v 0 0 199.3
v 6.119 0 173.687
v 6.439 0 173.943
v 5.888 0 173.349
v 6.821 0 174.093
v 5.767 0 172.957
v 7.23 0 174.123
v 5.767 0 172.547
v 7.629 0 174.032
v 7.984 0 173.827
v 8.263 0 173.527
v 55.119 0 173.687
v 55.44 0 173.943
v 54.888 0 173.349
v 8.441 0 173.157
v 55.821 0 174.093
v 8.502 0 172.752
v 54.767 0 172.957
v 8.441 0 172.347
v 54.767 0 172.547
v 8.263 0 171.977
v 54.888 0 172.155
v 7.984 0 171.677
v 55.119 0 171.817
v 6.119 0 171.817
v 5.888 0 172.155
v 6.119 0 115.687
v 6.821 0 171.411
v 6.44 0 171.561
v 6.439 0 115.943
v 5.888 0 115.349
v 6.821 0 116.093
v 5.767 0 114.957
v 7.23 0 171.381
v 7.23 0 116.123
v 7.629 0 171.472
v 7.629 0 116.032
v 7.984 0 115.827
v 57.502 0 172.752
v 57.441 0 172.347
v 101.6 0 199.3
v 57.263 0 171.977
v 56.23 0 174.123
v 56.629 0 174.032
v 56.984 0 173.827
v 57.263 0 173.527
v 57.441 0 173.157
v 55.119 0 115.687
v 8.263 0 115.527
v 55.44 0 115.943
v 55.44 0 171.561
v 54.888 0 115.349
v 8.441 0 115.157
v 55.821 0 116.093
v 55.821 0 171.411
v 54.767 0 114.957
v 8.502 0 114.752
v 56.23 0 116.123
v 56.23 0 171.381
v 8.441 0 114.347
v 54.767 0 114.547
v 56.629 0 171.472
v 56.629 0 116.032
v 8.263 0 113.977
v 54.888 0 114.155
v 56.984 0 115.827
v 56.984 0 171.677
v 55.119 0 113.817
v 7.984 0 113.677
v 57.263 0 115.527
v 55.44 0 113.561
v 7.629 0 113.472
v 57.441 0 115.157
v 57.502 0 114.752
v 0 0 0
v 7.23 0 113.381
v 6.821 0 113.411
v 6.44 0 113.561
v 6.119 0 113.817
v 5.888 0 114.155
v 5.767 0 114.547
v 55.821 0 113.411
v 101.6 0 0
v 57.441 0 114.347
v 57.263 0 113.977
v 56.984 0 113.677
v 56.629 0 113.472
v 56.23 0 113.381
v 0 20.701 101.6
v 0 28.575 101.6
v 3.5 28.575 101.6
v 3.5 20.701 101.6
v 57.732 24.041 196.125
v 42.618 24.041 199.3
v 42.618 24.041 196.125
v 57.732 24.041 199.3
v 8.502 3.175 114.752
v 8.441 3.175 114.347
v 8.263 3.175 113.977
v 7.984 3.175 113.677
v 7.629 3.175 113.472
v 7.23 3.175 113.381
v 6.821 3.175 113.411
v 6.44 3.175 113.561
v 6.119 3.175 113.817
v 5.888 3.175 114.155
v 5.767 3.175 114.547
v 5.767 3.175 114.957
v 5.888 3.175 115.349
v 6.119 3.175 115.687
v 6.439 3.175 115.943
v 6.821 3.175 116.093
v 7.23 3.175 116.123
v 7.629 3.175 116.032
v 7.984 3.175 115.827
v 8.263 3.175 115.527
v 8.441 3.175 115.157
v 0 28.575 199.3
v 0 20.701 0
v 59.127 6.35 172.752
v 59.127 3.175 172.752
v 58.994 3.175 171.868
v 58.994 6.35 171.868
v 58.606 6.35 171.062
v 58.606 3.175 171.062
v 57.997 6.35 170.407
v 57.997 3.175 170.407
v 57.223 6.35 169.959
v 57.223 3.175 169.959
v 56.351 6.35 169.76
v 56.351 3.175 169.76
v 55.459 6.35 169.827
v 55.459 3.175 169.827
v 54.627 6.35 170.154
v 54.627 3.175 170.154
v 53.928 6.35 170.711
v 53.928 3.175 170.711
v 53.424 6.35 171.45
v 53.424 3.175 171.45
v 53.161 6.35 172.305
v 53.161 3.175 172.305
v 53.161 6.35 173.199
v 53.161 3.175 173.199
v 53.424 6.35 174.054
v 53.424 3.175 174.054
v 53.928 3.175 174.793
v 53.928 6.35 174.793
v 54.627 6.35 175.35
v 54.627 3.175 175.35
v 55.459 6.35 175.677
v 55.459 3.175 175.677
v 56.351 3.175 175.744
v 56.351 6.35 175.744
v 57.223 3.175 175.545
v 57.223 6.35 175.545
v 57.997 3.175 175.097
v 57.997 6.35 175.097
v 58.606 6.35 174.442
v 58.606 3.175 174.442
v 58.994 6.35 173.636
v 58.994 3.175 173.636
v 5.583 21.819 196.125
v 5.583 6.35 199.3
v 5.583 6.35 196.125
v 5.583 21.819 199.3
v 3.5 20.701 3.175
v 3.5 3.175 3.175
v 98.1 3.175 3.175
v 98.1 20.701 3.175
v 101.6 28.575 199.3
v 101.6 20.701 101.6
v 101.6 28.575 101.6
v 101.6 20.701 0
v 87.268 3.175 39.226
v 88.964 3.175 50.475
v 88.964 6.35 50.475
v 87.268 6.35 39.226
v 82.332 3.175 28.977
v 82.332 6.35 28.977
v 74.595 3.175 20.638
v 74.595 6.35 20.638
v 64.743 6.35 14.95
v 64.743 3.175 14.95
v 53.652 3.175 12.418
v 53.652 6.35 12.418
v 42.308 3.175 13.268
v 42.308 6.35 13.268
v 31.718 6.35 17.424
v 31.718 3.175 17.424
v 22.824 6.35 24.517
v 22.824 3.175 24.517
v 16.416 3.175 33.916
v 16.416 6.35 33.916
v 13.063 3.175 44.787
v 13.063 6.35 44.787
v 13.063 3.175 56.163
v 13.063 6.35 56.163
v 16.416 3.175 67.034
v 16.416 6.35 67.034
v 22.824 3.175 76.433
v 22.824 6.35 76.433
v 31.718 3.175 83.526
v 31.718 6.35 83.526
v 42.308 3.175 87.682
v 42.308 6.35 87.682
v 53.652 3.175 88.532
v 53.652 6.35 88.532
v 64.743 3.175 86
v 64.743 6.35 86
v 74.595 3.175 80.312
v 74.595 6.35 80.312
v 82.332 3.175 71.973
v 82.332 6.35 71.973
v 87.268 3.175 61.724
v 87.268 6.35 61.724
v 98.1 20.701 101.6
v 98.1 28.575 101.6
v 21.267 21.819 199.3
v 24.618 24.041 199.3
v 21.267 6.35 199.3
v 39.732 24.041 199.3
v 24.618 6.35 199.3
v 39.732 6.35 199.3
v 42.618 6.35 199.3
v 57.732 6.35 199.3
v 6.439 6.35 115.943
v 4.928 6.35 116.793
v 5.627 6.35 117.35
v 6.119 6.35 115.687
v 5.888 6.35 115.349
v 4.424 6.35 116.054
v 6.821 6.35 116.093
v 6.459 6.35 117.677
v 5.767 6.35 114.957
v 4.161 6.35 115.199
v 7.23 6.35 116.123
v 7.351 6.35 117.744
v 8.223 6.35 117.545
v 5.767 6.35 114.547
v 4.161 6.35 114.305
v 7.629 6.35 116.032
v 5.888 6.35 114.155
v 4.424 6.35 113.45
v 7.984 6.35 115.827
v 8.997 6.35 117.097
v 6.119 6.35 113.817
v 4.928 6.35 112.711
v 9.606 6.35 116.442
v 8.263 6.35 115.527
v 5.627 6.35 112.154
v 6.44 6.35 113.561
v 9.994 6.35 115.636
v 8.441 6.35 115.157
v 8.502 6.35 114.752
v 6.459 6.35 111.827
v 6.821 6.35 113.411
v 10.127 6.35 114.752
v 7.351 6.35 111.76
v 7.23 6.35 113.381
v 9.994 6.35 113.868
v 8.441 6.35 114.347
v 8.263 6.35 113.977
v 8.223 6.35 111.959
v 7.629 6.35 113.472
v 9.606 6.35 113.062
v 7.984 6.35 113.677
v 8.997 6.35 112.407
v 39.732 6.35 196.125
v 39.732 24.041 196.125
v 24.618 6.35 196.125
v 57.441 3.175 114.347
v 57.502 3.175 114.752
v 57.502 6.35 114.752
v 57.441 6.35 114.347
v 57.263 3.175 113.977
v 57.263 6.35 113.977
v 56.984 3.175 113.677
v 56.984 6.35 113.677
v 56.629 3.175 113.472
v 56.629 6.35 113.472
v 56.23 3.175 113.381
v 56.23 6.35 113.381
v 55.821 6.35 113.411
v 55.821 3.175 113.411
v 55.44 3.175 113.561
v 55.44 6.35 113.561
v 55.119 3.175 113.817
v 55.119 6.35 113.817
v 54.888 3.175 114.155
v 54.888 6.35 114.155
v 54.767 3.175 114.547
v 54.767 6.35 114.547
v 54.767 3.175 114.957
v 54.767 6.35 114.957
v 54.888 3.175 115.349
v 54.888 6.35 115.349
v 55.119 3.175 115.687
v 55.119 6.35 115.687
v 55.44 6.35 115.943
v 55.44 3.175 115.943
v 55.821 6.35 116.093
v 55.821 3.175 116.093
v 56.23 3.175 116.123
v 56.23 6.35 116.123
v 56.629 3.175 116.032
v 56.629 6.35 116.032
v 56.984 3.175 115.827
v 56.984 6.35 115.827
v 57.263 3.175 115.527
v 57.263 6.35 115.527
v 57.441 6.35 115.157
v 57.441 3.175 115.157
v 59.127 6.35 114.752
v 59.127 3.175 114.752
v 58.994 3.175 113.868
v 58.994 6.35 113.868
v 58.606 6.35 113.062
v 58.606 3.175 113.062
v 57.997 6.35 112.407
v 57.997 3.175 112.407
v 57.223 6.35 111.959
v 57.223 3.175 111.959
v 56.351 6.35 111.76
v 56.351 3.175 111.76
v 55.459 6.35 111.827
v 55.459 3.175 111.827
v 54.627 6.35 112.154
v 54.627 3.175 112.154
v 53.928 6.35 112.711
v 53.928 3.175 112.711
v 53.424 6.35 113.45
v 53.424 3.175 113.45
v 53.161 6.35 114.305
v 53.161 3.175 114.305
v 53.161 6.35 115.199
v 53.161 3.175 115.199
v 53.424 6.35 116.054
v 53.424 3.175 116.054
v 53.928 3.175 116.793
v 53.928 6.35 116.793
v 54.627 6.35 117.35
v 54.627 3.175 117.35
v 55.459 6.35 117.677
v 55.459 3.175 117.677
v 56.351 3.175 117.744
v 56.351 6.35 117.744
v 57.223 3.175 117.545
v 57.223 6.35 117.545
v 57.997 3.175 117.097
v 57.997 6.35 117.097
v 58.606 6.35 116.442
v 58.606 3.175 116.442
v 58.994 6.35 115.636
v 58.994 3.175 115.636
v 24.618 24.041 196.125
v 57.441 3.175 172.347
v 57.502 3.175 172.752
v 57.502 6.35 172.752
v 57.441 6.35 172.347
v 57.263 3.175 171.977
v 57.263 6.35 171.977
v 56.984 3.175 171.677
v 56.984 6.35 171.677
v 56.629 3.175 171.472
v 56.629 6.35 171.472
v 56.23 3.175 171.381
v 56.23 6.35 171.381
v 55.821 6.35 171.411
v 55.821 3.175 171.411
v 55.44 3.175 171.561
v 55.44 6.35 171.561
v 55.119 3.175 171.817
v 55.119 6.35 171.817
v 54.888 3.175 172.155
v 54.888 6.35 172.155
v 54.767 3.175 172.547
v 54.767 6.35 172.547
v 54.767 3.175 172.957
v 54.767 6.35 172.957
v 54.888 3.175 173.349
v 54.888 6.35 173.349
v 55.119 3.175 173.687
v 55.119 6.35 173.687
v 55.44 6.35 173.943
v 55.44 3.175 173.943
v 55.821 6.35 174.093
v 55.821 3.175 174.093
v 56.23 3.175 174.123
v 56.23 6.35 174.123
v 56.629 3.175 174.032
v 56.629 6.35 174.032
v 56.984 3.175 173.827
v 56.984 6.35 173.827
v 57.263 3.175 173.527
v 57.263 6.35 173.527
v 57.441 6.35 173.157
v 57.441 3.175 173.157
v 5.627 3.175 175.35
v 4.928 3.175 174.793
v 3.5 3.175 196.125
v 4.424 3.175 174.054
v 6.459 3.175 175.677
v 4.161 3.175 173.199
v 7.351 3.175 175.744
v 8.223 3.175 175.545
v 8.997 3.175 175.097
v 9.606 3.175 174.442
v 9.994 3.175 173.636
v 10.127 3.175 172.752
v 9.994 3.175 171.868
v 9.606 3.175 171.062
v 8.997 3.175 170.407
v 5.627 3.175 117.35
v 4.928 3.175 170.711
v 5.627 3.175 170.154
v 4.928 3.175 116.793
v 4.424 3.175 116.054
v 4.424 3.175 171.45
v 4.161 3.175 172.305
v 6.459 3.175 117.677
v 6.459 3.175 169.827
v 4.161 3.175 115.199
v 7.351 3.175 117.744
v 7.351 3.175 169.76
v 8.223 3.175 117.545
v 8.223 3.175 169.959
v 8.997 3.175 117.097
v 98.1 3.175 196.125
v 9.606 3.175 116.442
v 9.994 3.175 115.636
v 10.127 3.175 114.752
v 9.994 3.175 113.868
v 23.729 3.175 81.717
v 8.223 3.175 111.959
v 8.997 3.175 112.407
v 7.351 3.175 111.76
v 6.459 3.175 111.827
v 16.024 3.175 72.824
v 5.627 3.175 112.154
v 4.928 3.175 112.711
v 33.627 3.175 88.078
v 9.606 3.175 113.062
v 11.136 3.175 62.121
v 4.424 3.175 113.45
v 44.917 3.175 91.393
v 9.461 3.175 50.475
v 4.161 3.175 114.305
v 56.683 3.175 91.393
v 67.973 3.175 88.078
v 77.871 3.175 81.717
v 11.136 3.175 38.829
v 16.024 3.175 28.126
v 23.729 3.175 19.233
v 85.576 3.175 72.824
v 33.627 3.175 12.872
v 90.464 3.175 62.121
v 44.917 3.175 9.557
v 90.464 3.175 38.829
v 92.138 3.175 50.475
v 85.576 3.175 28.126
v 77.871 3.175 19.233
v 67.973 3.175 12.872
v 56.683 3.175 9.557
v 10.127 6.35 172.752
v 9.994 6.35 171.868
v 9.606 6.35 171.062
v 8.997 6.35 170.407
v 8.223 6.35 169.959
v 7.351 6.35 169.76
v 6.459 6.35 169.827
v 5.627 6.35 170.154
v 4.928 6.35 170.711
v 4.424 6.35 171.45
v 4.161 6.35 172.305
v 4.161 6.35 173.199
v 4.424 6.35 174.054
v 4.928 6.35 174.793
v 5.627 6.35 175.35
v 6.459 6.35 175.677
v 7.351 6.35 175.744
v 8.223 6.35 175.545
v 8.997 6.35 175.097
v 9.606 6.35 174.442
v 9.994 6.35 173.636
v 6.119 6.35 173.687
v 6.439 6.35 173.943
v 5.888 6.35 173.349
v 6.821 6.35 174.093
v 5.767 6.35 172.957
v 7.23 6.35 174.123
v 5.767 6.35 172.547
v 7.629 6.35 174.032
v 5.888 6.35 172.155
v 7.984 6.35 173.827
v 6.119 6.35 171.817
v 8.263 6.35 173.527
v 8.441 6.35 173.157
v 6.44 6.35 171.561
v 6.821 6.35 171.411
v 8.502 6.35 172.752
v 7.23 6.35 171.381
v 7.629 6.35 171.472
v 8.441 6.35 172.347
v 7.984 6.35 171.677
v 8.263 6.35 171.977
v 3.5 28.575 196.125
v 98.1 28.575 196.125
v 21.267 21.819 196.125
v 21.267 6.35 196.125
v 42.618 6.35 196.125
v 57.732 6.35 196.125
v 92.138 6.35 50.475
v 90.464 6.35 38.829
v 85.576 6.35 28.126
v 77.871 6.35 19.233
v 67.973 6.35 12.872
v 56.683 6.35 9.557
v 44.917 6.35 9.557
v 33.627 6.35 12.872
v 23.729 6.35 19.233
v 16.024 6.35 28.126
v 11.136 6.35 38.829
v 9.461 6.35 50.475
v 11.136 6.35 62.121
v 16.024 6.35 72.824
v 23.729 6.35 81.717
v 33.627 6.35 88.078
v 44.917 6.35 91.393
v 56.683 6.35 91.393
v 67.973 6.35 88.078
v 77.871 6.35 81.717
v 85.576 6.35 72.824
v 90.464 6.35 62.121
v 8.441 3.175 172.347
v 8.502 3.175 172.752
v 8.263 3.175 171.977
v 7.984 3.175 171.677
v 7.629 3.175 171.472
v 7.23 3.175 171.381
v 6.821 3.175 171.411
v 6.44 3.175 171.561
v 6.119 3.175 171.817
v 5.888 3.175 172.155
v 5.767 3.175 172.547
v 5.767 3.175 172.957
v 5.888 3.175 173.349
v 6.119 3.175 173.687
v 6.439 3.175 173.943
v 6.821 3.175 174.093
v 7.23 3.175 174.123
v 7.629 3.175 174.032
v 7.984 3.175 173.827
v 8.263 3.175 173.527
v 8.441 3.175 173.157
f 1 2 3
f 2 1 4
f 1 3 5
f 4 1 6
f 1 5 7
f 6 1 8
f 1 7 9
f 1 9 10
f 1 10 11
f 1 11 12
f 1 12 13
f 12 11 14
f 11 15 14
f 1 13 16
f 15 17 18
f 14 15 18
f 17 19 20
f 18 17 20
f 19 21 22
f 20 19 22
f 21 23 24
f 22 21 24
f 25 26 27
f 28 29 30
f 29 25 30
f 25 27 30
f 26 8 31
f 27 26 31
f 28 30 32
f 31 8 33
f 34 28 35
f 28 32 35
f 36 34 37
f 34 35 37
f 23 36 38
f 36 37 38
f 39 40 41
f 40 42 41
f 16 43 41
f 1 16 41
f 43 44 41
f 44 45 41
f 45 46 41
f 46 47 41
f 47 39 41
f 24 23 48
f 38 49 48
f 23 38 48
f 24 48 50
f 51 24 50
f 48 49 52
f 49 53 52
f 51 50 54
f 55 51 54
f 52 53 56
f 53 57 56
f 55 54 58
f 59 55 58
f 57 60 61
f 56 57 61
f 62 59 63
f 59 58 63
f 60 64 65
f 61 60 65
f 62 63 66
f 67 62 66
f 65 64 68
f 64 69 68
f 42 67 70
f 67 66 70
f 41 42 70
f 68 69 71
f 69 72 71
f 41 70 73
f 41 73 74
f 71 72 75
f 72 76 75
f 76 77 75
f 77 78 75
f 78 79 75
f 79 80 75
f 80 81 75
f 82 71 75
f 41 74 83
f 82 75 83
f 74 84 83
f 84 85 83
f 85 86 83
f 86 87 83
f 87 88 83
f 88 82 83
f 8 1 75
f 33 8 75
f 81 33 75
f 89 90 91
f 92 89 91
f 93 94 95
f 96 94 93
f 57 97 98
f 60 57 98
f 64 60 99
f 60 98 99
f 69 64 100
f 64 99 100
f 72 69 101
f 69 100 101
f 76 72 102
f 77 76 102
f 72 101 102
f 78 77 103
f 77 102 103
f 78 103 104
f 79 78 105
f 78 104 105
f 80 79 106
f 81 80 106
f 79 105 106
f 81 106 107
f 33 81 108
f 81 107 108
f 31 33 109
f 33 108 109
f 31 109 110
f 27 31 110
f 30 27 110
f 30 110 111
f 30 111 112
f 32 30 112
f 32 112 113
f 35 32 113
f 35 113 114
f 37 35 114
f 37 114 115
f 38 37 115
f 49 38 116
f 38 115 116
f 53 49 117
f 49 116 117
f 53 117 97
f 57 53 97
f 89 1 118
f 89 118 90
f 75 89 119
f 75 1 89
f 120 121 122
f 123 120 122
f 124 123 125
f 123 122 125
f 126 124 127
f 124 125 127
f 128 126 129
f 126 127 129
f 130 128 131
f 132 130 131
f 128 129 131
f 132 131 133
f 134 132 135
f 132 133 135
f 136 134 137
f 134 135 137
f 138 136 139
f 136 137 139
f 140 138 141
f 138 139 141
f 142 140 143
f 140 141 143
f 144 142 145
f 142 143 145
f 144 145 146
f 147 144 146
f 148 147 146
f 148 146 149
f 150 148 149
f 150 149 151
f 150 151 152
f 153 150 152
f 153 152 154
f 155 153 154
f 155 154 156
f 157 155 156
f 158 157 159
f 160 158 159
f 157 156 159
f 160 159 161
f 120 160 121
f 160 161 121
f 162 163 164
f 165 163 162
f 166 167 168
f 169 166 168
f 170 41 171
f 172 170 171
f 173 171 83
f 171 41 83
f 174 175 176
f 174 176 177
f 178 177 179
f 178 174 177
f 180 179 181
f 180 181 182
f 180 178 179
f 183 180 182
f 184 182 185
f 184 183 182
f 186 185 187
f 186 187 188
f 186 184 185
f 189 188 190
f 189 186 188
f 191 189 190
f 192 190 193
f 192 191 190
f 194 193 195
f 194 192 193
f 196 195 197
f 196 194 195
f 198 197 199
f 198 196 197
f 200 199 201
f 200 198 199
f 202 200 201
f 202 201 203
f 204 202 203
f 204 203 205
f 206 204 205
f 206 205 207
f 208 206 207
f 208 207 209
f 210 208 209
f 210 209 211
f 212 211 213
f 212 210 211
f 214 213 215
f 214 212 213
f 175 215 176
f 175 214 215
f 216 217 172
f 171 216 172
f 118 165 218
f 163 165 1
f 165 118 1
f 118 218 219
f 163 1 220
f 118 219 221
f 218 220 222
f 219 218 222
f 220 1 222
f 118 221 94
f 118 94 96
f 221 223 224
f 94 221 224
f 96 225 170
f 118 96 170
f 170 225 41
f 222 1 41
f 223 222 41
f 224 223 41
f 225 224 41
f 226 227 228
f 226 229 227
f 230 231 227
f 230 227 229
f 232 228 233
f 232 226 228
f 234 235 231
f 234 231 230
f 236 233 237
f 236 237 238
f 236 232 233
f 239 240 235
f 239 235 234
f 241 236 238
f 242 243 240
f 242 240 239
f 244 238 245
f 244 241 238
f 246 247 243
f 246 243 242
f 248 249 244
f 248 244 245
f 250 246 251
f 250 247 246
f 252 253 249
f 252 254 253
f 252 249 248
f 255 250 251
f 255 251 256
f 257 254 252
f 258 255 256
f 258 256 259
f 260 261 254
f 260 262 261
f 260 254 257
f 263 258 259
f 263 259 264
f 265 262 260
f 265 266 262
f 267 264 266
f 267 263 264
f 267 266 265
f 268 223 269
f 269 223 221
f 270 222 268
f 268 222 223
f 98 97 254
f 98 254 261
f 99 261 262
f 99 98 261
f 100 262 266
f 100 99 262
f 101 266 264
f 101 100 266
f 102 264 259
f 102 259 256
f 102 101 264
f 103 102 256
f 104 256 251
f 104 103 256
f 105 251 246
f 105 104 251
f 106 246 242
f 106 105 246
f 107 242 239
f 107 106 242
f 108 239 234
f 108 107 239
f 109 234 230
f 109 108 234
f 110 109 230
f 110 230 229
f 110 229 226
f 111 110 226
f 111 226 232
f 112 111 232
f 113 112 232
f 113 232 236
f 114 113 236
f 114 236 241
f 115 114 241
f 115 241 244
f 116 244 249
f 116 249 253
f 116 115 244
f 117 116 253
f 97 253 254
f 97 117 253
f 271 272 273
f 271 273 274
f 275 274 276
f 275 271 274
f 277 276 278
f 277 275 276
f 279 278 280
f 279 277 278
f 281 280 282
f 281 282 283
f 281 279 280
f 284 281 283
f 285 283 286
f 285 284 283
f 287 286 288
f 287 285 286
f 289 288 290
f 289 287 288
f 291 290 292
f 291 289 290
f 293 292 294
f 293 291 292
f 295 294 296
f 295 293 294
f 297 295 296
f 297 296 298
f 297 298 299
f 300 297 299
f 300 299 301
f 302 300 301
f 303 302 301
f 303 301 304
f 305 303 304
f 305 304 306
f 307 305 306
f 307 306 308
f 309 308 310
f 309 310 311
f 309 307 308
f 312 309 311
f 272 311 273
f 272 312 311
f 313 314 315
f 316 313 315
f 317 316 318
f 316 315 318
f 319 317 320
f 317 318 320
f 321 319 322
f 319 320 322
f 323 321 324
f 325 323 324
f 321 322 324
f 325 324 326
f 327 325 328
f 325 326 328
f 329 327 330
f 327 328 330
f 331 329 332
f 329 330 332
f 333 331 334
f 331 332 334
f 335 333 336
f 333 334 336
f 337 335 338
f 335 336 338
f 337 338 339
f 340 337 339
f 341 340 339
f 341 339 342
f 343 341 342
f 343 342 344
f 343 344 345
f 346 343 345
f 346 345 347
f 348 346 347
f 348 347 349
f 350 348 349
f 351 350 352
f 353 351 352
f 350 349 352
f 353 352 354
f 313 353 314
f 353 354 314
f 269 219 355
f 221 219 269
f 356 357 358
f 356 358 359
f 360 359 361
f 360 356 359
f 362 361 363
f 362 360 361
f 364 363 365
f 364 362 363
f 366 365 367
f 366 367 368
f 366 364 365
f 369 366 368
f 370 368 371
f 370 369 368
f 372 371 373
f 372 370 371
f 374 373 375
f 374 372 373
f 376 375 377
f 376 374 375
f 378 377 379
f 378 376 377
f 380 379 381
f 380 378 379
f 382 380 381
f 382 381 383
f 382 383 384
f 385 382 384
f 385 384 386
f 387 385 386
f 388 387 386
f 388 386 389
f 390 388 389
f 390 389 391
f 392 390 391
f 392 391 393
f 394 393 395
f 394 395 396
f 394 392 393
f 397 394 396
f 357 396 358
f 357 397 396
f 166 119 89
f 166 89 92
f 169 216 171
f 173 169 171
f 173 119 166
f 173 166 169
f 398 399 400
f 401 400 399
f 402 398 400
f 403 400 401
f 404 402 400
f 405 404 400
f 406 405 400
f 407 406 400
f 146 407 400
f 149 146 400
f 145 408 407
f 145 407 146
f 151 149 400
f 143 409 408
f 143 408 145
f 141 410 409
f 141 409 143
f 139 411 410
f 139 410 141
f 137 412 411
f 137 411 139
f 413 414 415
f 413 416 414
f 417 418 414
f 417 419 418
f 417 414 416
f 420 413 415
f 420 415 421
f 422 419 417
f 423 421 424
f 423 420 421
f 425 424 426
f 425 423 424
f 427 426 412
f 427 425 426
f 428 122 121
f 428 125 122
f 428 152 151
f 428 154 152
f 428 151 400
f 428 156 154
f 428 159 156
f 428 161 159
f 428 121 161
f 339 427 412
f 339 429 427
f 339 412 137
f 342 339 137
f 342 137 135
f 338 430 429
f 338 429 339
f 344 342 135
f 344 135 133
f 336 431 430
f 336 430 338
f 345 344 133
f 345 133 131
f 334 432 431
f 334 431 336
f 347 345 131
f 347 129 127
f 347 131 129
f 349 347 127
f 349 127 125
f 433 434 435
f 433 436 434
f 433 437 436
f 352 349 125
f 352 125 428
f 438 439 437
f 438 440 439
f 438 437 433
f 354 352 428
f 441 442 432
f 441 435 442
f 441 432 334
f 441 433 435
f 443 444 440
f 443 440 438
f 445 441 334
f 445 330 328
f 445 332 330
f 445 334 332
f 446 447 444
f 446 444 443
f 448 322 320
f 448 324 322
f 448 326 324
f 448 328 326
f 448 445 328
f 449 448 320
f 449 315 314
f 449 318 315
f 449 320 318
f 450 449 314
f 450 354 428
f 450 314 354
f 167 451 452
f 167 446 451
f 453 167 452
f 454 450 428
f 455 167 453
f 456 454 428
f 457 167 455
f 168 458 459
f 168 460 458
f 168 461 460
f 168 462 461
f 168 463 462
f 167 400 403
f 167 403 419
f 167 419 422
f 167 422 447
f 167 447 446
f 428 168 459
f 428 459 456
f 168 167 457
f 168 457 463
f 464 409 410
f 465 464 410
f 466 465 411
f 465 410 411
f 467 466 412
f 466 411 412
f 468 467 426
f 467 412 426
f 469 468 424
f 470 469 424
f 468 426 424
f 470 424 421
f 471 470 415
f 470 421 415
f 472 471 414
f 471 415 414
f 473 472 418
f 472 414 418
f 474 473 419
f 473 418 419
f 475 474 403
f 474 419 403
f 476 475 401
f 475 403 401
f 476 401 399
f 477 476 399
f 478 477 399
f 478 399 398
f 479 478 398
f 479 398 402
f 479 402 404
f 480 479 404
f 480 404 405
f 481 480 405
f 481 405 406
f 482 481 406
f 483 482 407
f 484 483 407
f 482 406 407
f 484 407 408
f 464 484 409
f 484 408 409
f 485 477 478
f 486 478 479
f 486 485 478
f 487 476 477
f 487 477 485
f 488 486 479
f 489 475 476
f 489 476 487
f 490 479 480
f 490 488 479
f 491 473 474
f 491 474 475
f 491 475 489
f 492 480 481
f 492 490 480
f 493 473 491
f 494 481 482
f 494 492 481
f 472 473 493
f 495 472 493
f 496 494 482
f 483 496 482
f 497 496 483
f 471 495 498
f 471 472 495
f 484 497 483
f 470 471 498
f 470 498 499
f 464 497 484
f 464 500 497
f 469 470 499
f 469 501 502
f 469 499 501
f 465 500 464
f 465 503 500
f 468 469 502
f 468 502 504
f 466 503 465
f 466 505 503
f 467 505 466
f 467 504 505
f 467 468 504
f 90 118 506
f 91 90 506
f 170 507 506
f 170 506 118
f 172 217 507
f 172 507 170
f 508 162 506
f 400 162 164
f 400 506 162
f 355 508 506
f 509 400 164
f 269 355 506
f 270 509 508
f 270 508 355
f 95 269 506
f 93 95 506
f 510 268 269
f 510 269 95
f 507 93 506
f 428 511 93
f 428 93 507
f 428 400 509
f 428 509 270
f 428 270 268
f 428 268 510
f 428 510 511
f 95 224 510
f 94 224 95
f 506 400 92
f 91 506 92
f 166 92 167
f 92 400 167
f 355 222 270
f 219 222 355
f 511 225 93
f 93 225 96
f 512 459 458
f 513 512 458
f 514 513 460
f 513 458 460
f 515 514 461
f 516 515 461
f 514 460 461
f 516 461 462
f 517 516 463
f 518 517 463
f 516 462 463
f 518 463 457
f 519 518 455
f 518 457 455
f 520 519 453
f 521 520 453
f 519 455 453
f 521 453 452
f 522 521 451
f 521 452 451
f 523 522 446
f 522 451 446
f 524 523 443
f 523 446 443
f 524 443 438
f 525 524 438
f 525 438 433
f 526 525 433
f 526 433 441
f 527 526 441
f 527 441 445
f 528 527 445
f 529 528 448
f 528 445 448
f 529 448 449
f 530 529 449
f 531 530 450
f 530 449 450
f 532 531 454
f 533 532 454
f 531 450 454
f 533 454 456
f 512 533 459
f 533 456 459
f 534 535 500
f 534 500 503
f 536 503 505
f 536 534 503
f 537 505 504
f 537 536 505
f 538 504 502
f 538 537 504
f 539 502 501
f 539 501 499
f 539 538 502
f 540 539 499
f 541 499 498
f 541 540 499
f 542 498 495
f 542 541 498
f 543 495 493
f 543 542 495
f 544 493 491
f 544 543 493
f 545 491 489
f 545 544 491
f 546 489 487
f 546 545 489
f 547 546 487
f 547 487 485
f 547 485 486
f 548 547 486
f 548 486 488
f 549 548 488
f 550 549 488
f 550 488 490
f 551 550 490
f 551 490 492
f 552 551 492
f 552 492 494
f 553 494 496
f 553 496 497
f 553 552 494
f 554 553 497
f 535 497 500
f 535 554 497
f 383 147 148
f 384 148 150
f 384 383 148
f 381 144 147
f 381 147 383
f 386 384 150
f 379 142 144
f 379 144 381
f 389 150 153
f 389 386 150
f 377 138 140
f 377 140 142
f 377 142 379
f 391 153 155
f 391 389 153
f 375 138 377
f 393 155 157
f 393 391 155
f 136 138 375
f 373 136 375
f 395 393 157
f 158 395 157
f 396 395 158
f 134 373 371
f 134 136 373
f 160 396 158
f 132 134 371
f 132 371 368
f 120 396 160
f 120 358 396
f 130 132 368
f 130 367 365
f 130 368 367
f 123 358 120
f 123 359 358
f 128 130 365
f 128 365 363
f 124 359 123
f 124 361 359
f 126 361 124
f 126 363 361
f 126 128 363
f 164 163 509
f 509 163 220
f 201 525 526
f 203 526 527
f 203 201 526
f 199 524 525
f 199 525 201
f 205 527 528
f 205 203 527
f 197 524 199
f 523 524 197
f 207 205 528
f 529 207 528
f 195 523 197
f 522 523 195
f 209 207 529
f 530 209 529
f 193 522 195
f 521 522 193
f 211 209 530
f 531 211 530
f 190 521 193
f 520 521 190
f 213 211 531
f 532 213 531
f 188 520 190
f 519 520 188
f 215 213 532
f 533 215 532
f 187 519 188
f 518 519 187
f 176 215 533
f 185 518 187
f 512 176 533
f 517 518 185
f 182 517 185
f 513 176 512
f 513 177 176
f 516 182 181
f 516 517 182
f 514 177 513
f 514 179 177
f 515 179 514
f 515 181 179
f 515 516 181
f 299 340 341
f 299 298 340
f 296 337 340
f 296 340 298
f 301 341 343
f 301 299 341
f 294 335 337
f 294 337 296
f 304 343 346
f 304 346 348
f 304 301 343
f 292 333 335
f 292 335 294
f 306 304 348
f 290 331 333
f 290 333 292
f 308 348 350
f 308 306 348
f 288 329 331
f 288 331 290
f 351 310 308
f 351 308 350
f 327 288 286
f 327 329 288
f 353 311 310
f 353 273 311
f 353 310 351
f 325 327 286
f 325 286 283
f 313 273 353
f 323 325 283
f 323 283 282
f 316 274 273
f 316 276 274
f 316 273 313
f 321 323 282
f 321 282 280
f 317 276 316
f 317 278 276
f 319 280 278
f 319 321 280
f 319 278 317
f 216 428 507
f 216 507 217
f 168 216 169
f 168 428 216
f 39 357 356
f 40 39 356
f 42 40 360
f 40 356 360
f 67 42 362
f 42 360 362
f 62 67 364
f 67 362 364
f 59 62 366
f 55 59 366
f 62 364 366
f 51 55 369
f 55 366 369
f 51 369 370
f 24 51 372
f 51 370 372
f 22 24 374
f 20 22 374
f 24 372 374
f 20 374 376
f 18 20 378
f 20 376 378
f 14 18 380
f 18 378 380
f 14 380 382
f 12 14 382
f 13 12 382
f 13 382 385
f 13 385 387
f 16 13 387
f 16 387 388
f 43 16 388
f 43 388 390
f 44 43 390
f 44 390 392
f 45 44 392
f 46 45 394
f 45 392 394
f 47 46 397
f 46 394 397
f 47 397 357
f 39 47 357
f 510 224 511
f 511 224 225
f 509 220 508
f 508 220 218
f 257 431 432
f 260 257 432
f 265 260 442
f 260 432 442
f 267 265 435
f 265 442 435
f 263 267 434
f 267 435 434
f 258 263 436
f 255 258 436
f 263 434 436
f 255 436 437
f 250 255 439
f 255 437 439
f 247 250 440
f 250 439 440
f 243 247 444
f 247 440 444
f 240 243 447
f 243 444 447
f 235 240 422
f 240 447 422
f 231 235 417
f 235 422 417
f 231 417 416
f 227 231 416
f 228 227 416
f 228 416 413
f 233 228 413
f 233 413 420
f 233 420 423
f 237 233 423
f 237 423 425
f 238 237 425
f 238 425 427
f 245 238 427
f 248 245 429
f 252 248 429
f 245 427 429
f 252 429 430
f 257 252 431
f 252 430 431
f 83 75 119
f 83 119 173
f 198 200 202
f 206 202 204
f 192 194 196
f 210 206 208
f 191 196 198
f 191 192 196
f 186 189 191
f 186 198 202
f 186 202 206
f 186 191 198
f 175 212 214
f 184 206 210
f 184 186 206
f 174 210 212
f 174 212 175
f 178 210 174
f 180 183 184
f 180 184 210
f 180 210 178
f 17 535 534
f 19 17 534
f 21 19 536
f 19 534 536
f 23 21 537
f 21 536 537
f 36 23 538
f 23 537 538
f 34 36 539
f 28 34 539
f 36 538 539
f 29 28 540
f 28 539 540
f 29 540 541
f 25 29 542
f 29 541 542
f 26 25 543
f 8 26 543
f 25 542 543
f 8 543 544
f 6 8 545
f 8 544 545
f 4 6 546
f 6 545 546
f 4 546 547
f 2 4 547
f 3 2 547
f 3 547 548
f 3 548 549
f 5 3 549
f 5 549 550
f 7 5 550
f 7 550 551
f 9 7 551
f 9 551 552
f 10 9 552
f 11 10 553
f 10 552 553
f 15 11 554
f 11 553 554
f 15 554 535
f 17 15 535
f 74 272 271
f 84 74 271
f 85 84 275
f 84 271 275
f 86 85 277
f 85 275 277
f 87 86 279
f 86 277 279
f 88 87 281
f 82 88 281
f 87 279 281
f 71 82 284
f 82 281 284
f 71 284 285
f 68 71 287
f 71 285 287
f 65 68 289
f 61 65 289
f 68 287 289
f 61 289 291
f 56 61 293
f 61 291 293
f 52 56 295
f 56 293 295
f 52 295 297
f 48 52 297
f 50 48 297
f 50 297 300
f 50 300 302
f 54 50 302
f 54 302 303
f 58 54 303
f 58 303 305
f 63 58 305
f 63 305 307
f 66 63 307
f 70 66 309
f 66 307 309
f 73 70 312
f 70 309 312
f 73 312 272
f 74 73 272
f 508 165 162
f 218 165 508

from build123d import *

# Parameters (mm, degrees)
SKETCH2_W           = 101.6
SKETCH2_H           = 3.175
BOSS_EXTRUDE1_DEPTH = 199.3
SKETCH3_W           = 101.6
SKETCH3_H           = 199.3
SKETCH3_W_2         = 94.6
SKETCH3_H_2         = 192.95
BOSS_EXTRUDE2_DEPTH = 25.4
SKETCH5_R           = 41.3385
SKETCH5_R_2         = 38.1635
BOSS_EXTRUDE4_DEPTH = 3.175
SKETCH7_R           = 3
SKETCH7_R_2         = 1.375
BOSS_EXTRUDE5_DEPTH = 3.175
SKETCH8_W           = 15.6845
SKETCH8_H           = 15.4686
SKETCH8_W_2         = 15.113
SKETCH8_H_2         = 17.6911
CUT_EXTRUDE1_DEPTH  = 3.175
SKETCH9_R           = 1.375
CUT_EXTRUDE2_DEPTH  = 3.175
SKETCH10_W          = 101.6
SKETCH10_H          = 101.6
CUT_EXTRUDE3_DEPTH  = 7.874


with BuildPart() as part:
    # Sketch2 → Boss-Extrude1 (new body)
    with BuildSketch(Plane.XY):
        with Locations((50.8, 1.5875)):
            Rectangle(SKETCH2_W, SKETCH2_H)
    extrude(amount=BOSS_EXTRUDE1_DEPTH)

    # Sketch3 → Boss-Extrude2 (add)
    with BuildSketch(Plane(origin=(0, 3.175, 0), x_dir=(1, 0, 0), z_dir=(0, 1, 0))):
        with Locations((50.8, -99.65)):
            Rectangle(SKETCH3_W, SKETCH3_H)
        with Locations((50.8, -99.65)):
            Rectangle(SKETCH3_W_2, SKETCH3_H_2, mode=Mode.SUBTRACT)
    extrude(amount=BOSS_EXTRUDE2_DEPTH)

    # Sketch5 → Boss-Extrude4 (add)
    with BuildSketch(Plane(origin=(0, 3.175, 0), x_dir=(1, 0, 0), z_dir=(0, 1, 0))):
        with Locations((50.8, -50.475)):
            Circle(SKETCH5_R)
        with Locations((50.8, -50.475)):
            Circle(SKETCH5_R_2, mode=Mode.SUBTRACT)
    extrude(amount=BOSS_EXTRUDE4_DEPTH)

    # Sketch7 → Boss-Extrude5 (add)
    with BuildSketch(Plane(origin=(0, 3.175, 0), x_dir=(1, 0, 0), z_dir=(0, 1, 0))):
        with Locations((7.127, -172.752)):
            Circle(SKETCH7_R)
        with Locations((7.127, -172.752)):
            Circle(SKETCH7_R_2, mode=Mode.SUBTRACT)
        with Locations((7.127, -114.752)):
            Circle(SKETCH7_R)
        with Locations((7.127, -114.752)):
            Circle(SKETCH7_R_2, mode=Mode.SUBTRACT)
        with Locations((56.127, -172.752)):
            Circle(SKETCH7_R)
        with Locations((56.127, -172.752)):
            Circle(SKETCH7_R_2, mode=Mode.SUBTRACT)
        with Locations((56.127, -114.752)):
            Circle(SKETCH7_R)
        with Locations((56.127, -114.752)):
            Circle(SKETCH7_R_2, mode=Mode.SUBTRACT)
    extrude(amount=BOSS_EXTRUDE5_DEPTH)

    # Sketch8 → Cut-Extrude1 (cut)
    with BuildSketch(Plane.XY.offset(199.3)):
        with Locations((13.425, 14.0843)):
            Rectangle(SKETCH8_W, SKETCH8_H)
        with Locations((32.175, 15.19555)):
            Rectangle(SKETCH8_W_2, SKETCH8_H_2)
        with Locations((50.175, 15.19555)):
            Rectangle(SKETCH8_W_2, SKETCH8_H_2)
    extrude(amount=-CUT_EXTRUDE1_DEPTH, mode=Mode.SUBTRACT)

    # Sketch9 → Cut-Extrude2 (cut)
    with BuildSketch(Plane(origin=(0, 3.175, 0), x_dir=(1, 0, 0), z_dir=(0, 1, 0))):
        with Locations((7.127, -114.752)):
            Circle(SKETCH9_R)
        with Locations((56.127, -114.752)):
            Circle(SKETCH9_R)
        with Locations((56.127, -172.752)):
            Circle(SKETCH9_R)
        with Locations((7.127, -172.752)):
            Circle(SKETCH9_R)
    extrude(amount=-CUT_EXTRUDE2_DEPTH, mode=Mode.SUBTRACT)

    # Sketch10 → Cut-Extrude3 (cut)
    with BuildSketch(Plane(origin=(0, 28.575, 0), x_dir=(1, 0, 0), z_dir=(0, 1, 0))):
        with Locations((50.8, -50.8)):
            Rectangle(SKETCH10_W, SKETCH10_H)
    extrude(amount=-CUT_EXTRUDE3_DEPTH, mode=Mode.SUBTRACT)


solid = part.part
